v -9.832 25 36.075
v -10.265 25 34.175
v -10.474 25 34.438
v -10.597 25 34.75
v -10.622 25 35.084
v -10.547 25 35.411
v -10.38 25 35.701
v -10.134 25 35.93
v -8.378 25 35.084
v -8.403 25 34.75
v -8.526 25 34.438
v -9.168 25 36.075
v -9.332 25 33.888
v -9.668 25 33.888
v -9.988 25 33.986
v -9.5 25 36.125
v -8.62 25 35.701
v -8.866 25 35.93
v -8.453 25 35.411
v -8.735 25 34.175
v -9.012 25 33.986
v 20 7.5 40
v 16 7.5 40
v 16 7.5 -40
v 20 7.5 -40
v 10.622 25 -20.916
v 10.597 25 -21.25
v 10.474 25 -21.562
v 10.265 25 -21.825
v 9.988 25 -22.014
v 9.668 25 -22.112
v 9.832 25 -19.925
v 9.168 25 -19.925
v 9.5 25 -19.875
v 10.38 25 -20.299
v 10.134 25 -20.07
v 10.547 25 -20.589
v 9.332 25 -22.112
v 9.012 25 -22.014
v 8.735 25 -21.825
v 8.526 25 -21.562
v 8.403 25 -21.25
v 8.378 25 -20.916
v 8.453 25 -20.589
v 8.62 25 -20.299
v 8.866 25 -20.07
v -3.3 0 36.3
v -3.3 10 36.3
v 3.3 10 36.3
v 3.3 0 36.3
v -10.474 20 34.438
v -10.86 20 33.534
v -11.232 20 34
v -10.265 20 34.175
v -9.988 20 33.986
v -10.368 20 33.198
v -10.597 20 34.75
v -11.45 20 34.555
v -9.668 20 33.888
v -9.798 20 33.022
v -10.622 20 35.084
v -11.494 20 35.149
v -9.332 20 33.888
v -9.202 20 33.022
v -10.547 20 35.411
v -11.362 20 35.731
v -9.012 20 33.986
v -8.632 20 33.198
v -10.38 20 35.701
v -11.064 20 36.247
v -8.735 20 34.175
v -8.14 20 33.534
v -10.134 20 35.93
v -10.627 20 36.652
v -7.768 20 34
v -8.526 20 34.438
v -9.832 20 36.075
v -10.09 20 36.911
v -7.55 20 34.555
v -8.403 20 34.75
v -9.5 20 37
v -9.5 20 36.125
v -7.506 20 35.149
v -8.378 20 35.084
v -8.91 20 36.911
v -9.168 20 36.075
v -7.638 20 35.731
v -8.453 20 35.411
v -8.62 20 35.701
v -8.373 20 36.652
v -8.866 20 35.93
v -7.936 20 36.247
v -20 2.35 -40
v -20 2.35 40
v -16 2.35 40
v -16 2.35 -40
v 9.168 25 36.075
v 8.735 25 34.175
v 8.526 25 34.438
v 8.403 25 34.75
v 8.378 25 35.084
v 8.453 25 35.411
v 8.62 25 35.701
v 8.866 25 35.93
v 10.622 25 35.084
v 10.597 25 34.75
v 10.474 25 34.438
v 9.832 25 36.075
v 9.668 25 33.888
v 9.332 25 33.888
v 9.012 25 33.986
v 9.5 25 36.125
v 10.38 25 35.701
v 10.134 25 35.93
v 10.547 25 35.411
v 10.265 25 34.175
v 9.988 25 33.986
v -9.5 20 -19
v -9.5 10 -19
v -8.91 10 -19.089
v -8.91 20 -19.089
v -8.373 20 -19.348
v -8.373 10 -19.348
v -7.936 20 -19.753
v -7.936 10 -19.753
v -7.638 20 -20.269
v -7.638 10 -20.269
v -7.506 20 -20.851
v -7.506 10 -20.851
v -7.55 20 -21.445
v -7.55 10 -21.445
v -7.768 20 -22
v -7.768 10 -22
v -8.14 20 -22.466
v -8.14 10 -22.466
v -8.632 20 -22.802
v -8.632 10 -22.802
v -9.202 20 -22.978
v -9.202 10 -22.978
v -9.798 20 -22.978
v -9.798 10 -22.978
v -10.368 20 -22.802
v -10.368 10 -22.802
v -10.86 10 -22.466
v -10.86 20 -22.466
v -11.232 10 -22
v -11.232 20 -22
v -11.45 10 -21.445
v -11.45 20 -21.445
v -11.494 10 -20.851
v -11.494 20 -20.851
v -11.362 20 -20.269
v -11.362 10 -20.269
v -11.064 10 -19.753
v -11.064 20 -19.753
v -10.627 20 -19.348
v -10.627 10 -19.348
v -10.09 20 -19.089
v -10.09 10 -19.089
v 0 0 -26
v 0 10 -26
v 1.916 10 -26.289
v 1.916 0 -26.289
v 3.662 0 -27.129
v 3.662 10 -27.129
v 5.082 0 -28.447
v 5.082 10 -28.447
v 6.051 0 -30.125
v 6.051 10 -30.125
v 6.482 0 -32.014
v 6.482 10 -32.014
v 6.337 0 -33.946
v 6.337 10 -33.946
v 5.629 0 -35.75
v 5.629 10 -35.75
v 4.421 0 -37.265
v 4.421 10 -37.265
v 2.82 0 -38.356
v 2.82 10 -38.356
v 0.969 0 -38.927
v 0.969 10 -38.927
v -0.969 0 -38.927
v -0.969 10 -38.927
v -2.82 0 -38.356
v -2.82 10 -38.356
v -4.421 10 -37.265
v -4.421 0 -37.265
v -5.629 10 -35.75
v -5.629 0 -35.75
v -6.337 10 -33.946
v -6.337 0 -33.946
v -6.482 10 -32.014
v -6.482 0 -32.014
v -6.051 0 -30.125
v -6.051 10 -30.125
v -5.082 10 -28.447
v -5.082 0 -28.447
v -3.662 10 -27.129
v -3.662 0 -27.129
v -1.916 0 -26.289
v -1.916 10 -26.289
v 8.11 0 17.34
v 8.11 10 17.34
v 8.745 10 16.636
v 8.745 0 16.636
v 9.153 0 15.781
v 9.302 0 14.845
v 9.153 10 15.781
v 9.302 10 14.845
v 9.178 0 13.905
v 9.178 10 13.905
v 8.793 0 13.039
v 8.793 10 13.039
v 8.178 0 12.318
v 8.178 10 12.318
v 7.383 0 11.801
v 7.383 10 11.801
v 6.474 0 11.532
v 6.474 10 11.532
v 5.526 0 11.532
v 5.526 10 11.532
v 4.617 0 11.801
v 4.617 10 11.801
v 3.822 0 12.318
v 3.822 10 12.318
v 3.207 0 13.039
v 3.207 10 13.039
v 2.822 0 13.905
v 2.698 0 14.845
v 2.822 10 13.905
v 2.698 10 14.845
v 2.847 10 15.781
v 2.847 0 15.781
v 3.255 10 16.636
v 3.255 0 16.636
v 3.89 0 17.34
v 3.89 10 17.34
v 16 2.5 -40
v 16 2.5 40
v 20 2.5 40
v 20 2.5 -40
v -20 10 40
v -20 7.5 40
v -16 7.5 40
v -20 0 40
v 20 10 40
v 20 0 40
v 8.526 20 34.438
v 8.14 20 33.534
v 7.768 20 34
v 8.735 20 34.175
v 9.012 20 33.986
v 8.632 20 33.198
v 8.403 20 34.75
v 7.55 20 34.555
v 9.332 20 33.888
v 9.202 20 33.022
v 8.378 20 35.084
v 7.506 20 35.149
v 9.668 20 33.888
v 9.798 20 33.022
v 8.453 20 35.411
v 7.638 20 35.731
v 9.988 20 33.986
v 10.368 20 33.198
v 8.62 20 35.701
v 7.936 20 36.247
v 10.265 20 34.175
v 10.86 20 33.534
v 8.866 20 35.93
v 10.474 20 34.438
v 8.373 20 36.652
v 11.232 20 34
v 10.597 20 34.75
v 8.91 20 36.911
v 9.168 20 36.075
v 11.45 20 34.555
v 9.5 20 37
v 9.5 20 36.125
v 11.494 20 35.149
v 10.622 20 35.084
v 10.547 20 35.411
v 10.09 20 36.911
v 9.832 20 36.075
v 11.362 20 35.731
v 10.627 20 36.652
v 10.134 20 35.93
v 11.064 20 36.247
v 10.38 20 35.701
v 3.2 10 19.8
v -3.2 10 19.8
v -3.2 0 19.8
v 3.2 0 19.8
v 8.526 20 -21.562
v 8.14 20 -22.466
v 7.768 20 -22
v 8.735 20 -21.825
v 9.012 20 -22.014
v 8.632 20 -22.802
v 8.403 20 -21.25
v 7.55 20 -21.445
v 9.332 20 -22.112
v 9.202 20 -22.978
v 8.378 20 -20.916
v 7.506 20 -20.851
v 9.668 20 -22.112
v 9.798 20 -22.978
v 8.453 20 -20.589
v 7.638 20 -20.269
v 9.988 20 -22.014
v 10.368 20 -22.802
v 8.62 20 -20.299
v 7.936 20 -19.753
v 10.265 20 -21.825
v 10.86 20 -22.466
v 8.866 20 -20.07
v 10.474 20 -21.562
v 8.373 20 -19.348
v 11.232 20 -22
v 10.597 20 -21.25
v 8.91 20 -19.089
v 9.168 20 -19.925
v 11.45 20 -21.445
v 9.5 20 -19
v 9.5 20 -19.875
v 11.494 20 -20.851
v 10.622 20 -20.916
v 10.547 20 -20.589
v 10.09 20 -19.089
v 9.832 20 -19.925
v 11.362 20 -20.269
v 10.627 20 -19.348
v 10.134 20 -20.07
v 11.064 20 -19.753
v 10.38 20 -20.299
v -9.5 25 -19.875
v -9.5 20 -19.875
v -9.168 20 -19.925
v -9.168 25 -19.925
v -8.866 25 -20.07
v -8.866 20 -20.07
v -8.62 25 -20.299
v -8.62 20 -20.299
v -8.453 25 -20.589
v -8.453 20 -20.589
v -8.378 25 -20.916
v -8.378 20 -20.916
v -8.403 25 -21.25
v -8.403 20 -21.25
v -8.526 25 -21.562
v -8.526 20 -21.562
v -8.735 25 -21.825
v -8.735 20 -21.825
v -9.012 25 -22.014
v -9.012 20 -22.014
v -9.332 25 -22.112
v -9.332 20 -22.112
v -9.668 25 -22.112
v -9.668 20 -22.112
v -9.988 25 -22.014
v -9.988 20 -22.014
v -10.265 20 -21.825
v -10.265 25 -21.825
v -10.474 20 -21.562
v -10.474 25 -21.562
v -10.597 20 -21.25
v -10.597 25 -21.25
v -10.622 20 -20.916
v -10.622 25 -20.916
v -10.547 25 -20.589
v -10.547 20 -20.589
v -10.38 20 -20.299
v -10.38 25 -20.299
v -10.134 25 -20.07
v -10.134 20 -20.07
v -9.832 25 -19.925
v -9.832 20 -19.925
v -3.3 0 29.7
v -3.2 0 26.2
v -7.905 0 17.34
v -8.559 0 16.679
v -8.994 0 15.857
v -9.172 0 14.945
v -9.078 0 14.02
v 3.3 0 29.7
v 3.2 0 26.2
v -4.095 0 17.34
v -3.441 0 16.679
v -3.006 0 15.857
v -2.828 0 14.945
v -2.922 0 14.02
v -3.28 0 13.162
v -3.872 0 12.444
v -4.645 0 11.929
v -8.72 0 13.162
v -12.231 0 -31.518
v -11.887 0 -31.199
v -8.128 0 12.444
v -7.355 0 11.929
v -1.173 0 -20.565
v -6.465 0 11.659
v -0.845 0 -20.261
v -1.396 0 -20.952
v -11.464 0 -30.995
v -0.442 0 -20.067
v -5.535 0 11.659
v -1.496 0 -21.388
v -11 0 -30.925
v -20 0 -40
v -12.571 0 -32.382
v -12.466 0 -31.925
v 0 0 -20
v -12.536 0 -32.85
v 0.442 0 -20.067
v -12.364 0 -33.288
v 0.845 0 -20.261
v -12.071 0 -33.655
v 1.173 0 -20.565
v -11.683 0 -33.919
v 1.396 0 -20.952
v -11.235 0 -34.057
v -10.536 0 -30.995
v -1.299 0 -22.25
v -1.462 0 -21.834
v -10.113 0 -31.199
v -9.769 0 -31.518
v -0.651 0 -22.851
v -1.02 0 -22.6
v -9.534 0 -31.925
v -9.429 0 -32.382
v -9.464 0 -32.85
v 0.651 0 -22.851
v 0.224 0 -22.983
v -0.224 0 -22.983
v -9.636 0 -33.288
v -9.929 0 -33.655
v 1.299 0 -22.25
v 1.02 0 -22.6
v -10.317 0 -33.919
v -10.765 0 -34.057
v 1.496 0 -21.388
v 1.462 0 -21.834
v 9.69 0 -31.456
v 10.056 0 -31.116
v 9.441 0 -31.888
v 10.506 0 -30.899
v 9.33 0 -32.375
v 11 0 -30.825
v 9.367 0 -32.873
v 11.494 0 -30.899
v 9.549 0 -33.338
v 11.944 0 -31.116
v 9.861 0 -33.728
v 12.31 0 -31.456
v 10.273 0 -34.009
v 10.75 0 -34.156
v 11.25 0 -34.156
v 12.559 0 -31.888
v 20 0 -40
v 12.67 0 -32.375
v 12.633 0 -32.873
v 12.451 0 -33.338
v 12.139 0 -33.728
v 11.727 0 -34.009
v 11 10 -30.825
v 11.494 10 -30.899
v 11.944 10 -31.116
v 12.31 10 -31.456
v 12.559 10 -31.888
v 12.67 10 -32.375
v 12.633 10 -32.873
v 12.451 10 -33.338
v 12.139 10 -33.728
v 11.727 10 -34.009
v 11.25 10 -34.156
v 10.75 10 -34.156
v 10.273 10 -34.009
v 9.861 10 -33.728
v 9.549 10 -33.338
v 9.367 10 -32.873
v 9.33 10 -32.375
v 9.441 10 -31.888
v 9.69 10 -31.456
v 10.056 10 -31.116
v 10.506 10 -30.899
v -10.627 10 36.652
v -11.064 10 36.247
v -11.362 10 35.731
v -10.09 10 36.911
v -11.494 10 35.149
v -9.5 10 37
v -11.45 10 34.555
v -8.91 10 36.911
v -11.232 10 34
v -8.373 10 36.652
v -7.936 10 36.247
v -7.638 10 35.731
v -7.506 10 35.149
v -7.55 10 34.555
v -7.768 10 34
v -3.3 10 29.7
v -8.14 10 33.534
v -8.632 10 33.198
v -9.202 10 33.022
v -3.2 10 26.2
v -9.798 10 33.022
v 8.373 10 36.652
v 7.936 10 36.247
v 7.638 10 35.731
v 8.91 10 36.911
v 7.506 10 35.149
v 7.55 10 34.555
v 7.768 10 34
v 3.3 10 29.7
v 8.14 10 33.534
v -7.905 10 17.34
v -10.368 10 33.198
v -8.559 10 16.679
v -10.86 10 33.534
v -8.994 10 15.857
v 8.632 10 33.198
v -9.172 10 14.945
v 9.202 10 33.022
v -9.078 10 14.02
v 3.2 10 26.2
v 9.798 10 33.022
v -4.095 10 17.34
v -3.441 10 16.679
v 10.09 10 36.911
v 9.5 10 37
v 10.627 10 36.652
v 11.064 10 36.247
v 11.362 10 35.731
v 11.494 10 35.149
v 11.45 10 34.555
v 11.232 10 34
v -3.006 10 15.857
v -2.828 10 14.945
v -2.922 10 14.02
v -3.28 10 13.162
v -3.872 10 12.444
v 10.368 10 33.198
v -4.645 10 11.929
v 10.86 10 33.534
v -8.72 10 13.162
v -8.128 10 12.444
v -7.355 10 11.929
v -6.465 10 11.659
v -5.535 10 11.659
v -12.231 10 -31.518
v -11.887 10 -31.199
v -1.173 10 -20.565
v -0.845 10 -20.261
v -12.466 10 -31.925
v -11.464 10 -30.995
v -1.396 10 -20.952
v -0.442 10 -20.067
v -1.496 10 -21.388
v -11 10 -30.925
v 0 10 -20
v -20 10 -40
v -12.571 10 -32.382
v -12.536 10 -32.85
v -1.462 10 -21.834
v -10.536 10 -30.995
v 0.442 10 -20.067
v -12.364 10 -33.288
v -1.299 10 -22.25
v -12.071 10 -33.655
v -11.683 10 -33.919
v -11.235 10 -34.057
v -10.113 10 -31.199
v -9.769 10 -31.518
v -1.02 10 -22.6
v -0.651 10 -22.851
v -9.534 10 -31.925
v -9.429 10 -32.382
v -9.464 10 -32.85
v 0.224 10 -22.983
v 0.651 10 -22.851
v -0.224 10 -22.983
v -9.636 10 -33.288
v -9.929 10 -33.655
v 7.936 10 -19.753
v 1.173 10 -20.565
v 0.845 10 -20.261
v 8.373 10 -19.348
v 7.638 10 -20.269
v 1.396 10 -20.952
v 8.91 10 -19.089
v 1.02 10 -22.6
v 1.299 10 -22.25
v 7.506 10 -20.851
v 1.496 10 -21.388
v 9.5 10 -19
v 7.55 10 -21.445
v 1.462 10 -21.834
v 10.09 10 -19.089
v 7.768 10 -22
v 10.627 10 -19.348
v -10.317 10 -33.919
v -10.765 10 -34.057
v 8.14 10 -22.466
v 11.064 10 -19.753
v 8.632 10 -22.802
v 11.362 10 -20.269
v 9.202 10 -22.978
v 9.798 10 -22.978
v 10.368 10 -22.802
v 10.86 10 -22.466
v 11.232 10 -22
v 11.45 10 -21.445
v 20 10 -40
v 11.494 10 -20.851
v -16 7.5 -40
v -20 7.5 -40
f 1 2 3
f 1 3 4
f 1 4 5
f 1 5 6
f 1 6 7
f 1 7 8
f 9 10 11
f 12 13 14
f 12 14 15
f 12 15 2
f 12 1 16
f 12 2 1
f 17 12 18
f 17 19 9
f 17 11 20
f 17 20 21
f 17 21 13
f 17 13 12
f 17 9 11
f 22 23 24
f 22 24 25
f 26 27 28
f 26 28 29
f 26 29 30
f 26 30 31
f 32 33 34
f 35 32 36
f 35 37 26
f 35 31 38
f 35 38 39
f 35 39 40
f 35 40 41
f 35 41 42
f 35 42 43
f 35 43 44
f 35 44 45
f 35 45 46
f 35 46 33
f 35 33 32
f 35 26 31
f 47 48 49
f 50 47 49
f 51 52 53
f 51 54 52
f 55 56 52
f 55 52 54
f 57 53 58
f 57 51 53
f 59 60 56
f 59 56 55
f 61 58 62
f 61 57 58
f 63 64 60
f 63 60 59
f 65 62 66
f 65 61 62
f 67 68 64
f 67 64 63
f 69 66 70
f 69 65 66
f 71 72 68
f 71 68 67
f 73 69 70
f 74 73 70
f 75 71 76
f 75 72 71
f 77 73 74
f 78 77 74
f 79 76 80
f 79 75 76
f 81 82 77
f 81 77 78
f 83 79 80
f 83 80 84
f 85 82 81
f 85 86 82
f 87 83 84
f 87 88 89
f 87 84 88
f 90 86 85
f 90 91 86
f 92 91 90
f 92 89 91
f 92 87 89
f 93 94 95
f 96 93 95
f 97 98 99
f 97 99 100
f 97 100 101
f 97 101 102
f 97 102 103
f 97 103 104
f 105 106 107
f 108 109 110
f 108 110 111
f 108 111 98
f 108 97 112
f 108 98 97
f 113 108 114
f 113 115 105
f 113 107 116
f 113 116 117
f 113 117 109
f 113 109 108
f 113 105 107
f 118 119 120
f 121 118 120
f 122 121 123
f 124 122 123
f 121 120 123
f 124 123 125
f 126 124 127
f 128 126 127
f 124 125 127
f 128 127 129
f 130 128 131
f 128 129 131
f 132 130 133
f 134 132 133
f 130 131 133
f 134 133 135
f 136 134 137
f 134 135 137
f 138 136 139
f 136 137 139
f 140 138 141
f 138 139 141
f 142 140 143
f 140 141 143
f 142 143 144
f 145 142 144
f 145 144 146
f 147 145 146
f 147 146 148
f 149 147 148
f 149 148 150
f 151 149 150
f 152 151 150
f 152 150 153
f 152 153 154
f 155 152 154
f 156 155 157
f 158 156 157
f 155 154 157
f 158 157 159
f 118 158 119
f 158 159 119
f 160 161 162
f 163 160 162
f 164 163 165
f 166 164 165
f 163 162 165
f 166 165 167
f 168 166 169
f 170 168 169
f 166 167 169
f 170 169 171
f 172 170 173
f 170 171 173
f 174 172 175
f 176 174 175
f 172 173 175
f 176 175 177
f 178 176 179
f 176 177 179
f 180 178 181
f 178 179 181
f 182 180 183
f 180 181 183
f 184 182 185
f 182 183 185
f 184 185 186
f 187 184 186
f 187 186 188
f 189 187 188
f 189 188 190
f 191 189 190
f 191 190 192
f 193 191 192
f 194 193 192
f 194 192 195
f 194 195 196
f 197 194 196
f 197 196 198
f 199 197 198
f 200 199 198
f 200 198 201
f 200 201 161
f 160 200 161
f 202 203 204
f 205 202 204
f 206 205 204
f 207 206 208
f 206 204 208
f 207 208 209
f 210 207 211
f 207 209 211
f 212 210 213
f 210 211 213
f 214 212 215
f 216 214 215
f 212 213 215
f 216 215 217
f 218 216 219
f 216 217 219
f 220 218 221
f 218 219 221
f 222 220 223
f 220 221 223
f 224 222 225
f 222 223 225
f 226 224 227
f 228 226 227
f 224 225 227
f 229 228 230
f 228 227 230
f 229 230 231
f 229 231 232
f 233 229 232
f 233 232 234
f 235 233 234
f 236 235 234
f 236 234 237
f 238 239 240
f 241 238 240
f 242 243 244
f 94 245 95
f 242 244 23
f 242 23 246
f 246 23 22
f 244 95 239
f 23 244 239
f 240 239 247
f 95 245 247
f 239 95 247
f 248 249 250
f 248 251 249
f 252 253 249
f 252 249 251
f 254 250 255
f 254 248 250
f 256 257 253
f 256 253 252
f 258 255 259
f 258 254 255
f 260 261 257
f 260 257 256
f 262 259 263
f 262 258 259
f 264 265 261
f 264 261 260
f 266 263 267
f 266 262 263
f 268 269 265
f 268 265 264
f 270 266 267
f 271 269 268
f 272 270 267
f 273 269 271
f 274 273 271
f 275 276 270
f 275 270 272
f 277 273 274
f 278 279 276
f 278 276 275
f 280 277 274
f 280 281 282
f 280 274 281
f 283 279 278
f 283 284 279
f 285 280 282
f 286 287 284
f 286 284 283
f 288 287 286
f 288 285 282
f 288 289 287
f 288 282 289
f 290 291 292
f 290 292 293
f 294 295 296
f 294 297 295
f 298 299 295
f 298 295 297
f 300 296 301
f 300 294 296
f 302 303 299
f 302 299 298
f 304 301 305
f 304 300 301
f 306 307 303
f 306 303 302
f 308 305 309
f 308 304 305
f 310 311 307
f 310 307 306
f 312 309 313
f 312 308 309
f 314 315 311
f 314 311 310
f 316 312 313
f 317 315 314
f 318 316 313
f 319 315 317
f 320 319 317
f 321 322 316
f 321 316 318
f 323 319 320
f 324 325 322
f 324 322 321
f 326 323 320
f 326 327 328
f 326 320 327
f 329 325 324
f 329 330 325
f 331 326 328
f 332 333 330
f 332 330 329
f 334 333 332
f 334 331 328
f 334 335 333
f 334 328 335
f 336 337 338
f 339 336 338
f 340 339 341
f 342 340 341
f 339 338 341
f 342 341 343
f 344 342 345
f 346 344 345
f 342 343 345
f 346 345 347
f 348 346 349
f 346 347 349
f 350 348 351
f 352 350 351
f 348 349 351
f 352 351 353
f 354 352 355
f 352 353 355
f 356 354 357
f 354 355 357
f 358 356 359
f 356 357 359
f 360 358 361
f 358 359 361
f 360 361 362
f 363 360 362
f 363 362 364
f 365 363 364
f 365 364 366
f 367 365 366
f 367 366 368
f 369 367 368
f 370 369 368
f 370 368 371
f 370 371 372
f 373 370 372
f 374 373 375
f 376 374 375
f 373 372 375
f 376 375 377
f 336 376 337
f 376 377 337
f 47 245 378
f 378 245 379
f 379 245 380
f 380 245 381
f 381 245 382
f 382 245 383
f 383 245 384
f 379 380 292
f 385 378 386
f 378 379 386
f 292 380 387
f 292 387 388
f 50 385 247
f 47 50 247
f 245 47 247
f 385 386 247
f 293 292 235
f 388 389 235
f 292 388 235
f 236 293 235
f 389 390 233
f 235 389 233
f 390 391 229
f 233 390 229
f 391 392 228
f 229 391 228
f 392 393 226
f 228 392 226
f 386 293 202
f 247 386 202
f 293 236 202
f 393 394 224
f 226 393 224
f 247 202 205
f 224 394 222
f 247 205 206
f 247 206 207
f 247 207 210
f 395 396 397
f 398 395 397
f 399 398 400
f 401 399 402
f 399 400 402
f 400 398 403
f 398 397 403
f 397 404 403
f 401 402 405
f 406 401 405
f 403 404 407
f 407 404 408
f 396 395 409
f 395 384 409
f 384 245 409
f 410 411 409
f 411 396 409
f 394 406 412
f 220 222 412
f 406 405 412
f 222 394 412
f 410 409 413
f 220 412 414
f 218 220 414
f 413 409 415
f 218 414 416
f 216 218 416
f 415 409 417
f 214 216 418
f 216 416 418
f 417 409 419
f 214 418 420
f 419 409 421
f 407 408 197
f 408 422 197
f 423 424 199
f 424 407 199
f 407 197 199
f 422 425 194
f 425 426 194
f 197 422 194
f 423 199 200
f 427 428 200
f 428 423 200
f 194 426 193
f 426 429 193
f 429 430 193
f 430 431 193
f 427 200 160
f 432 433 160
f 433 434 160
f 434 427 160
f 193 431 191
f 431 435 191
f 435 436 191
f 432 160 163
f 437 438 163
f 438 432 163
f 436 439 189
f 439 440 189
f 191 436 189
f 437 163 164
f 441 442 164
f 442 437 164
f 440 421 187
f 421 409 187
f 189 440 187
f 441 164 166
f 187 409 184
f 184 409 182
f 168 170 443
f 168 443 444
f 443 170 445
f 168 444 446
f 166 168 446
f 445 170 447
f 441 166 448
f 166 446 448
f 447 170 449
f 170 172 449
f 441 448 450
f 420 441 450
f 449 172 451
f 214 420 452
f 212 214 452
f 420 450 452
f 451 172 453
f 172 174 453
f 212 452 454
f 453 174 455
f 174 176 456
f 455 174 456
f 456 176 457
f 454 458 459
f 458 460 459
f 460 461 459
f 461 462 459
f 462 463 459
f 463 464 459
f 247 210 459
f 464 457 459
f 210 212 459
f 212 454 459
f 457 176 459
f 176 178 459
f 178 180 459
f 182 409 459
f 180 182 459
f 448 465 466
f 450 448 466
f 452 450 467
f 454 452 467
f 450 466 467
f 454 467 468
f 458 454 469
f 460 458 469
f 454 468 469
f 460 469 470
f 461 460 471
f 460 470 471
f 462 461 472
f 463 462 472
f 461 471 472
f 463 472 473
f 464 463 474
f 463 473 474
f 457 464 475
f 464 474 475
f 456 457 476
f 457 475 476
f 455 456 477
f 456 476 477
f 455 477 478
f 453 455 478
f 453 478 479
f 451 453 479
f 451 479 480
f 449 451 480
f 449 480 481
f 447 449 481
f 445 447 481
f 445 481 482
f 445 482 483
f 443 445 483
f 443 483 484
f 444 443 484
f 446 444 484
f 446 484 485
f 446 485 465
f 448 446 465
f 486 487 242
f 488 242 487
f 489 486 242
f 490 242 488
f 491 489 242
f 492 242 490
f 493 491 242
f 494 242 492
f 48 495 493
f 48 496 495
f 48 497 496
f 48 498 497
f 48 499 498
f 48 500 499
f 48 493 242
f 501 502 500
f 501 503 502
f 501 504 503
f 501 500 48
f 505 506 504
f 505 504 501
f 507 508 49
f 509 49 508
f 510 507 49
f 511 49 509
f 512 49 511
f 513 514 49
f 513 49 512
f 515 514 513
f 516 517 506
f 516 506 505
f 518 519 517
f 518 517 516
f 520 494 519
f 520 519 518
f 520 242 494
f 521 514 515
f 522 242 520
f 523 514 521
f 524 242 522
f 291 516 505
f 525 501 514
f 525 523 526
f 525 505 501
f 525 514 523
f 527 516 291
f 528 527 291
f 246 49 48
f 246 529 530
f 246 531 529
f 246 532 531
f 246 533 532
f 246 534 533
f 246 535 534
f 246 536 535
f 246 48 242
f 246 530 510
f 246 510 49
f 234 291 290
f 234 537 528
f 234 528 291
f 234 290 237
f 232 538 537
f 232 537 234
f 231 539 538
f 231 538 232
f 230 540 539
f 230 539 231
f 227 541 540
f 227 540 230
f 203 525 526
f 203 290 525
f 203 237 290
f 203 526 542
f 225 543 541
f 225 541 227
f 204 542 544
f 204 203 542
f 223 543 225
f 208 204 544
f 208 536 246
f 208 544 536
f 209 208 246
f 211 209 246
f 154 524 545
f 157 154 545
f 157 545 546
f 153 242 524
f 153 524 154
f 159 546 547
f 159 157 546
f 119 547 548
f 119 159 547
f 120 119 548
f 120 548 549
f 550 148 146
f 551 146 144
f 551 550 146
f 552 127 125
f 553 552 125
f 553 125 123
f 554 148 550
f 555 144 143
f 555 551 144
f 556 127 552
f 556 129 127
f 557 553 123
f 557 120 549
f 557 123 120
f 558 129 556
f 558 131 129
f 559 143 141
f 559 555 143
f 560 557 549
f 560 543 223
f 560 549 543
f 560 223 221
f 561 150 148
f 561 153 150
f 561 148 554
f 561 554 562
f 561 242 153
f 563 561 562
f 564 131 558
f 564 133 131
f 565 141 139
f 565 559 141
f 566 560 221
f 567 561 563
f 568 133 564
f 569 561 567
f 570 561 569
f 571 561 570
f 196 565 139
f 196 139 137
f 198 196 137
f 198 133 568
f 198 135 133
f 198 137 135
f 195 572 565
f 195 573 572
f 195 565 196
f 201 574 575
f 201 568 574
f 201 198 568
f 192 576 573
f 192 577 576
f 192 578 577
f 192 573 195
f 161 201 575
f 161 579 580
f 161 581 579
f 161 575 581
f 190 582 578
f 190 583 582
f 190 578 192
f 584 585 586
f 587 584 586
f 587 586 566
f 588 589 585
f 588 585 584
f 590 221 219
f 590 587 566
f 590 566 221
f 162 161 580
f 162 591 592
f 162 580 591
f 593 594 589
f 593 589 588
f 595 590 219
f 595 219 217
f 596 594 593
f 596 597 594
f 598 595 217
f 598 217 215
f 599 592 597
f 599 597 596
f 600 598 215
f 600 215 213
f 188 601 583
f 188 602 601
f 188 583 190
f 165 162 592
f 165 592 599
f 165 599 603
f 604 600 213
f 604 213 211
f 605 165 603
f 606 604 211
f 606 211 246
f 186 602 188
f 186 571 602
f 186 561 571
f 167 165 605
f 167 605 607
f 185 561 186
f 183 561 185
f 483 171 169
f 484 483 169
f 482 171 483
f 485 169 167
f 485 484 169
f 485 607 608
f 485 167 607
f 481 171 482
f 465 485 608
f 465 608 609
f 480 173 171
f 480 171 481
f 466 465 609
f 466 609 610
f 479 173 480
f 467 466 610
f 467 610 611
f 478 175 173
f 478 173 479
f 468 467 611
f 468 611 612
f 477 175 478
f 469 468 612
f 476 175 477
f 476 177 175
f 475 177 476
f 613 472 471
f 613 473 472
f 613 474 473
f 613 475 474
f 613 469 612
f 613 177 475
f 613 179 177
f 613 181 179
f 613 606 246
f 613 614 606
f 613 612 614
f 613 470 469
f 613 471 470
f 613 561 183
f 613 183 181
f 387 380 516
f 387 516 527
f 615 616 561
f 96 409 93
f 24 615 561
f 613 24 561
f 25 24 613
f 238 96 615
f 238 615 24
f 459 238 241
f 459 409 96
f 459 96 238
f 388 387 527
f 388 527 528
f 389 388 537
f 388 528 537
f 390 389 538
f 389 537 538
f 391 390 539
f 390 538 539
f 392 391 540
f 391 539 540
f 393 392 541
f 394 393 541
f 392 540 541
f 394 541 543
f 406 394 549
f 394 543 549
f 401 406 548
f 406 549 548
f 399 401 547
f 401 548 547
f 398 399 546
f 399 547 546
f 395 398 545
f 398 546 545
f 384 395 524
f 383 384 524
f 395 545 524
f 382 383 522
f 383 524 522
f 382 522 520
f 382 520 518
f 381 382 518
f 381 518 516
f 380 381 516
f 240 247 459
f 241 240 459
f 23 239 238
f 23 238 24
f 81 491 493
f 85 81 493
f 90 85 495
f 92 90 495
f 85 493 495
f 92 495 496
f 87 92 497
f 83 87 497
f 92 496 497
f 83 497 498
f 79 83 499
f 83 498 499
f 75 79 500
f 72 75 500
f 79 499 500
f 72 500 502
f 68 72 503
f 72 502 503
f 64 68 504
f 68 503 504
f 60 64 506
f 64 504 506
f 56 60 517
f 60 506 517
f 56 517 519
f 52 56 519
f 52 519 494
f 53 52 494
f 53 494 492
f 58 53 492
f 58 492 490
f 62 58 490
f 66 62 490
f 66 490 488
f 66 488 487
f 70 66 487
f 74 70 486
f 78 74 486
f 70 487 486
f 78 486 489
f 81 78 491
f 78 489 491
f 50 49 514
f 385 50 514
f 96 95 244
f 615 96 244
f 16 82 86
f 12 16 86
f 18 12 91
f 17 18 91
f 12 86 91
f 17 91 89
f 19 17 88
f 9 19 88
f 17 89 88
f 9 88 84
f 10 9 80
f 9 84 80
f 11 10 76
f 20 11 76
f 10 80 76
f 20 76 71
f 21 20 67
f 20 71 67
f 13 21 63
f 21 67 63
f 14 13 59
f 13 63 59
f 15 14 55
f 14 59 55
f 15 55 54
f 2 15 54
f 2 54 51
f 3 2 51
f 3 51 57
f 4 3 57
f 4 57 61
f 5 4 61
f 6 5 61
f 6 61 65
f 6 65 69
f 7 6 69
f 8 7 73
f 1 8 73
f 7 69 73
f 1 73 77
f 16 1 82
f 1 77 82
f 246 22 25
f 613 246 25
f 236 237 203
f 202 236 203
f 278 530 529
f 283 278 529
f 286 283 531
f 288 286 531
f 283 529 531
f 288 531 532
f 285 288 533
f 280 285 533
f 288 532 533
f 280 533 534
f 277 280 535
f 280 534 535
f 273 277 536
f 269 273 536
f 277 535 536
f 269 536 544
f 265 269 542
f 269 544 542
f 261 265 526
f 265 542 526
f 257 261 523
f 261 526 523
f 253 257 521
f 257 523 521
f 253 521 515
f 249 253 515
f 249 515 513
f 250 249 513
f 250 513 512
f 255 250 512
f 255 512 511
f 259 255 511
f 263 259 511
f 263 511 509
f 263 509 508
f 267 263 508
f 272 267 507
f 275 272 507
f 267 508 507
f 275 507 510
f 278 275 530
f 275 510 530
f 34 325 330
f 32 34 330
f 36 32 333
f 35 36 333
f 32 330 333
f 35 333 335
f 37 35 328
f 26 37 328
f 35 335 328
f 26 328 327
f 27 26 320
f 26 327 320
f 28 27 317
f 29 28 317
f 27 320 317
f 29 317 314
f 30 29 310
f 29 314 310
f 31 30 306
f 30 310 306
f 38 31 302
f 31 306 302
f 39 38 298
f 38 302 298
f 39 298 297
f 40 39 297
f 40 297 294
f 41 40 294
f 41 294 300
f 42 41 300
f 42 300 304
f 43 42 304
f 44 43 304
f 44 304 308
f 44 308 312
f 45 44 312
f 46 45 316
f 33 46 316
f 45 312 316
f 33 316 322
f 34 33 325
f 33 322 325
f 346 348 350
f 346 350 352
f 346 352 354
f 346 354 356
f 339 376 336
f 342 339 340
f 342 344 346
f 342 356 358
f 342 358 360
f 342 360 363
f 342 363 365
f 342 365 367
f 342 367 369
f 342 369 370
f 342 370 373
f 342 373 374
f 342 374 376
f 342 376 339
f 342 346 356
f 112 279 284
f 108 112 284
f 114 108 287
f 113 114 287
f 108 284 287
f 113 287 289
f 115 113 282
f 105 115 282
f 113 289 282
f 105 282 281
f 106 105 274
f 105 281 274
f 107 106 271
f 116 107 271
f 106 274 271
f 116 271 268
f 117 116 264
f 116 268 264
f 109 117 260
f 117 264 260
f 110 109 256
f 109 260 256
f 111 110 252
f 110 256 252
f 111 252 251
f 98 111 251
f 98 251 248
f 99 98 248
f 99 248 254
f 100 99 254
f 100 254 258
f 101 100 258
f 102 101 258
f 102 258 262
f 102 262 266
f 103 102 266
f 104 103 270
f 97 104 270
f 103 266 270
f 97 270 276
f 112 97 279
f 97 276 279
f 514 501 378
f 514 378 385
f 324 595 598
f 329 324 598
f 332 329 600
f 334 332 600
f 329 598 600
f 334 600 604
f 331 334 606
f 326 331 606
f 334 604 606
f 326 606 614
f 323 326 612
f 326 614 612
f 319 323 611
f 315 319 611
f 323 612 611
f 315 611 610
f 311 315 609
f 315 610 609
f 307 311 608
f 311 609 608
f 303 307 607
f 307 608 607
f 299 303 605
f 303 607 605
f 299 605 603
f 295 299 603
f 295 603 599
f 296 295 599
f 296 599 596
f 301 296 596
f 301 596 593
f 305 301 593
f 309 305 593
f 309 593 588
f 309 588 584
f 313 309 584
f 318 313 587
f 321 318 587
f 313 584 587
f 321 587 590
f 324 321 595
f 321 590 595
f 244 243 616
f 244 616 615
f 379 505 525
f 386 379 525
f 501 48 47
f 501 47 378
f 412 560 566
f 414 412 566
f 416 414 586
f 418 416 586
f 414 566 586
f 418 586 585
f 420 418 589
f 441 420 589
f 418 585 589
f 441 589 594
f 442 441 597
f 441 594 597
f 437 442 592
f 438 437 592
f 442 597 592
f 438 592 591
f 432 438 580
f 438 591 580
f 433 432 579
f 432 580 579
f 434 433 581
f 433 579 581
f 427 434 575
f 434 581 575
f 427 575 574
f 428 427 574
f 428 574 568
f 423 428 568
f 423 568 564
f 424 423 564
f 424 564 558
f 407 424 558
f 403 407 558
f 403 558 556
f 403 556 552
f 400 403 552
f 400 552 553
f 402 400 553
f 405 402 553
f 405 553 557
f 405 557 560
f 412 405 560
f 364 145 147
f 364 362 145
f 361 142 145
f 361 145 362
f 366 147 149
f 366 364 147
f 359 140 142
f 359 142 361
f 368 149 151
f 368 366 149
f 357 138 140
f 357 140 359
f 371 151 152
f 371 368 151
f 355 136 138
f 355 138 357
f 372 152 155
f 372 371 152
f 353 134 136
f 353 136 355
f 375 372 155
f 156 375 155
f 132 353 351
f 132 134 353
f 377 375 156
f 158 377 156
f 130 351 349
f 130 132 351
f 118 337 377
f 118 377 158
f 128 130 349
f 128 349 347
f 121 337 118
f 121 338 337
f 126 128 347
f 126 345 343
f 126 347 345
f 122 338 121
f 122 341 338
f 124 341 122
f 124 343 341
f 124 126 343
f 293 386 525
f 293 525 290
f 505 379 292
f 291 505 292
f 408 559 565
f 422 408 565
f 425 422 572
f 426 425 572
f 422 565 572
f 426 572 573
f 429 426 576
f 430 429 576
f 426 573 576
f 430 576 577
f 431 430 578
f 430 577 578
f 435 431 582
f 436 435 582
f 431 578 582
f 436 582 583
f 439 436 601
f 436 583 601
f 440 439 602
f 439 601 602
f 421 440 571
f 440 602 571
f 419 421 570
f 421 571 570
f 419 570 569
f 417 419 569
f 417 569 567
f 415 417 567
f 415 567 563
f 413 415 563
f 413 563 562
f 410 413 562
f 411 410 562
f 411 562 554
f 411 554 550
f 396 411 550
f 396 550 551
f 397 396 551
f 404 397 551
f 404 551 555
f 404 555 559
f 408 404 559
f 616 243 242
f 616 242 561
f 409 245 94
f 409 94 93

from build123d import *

# Parameters (mm, degrees)
ESQUISSE2_W             = 40
ESQUISSE2_H             = 80
BOSS_EXTRU_1_DEPTH      = 10
ESQUISSE3_R             = 2
BOSS_EXTRU_2_DEPTH      = 10
ESQUISSE4_R             = 1.125
BOSS_EXTRU_3_DEPTH      = 5
ENL_V_MAT_EXTRU_1_REACH = 49.17
ESQUISSE5_R             = 1.5
ESQUISSE5_R_2           = 1.575
ESQUISSE5_R_3           = 1.675
ESQUISSE5_R_4           = 6.5
ENL_V_MAT_EXTRU_2_REACH = 49.17
ESQUISSE6_W             = 6.6
ESQUISSE6_H             = 6.6
ESQUISSE6_W_2           = 6.4
ESQUISSE6_H_2           = 6.4
ENL_V_MAT_EXTRU_3_DEPTH = 10
ENL_V_MAT_EXTRU_4_REACH = 88.168
ESQUISSE8_W             = 4
ESQUISSE8_H             = 5
ESQUISSE8_H_2           = 5.15


with BuildPart() as part:
    # Esquisse2 → Boss.-Extru.1 (new body)
    with BuildSketch(Plane(origin=(0, 0, 0), x_dir=(1, 0, 0), z_dir=(0, 1, 0))):
        Rectangle(ESQUISSE2_W, ESQUISSE2_H)
    extrude(amount=BOSS_EXTRU_1_DEPTH)

    # Esquisse3 → Boss.-Extru.2 (add)
    with BuildSketch(Plane(origin=(0, 10, 0), x_dir=(1, 0, 0), z_dir=(0, 1, 0))):
        with Locations(Location((9.5, -35, 0), (0, 0, 270))):
            Circle(ESQUISSE3_R)
        with Locations(Location((9.5, 21, 0), (0, 0, 270))):
            Circle(ESQUISSE3_R)
        with Locations(Location((-9.5, -35, 0), (0, 0, 270))):
            Circle(ESQUISSE3_R)
        with Locations(Location((-9.5, 21, 0), (0, 0, 270))):
            Circle(ESQUISSE3_R)
    extrude(amount=BOSS_EXTRU_2_DEPTH)

    # Esquisse4 → Boss.-Extru.3 (add)
    with BuildSketch(Plane(origin=(0, 20, 0), x_dir=(1, 0, 0), z_dir=(0, 1, 0))):
        with Locations(Location((-9.5, -35, 0), (0, 0, 270))):
            Circle(ESQUISSE4_R)
        with Locations(Location((9.5, -35, 0), (0, 0, 270))):
            Circle(ESQUISSE4_R)
        with Locations(Location((-9.5, 21, 0), (0, 0, 270))):
            Circle(ESQUISSE4_R)
        with Locations(Location((9.5, 21, 0), (0, 0, 270))):
            Circle(ESQUISSE4_R)
    extrude(amount=BOSS_EXTRU_3_DEPTH)

    # Esquisse5 → Enlèv. mat.-Extru.1 (cut, up to next)
    with BuildSketch(Plane(origin=(0, 10, 0), x_dir=(1, 0, 0), z_dir=(0, 1, 0)), mode=Mode.PRIVATE) as enl_v_mat_extru_1_sk1:
        with Locations(Location((0, 21.5, 0), (0, 0, 270))):
            Circle(ESQUISSE5_R)
    enl_v_mat_extru_1_tool1 = extrude(enl_v_mat_extru_1_sk1.sketch, amount=-ENL_V_MAT_EXTRU_1_REACH, mode=Mode.PRIVATE) & part.part
    # Esquisse5 → Enlèv. mat.-Extru.1 (cut, up to next)
    with BuildSketch(Plane(origin=(0, 10, 0), x_dir=(1, 0, 0), z_dir=(0, 1, 0)), mode=Mode.PRIVATE) as enl_v_mat_extru_1_sk2:
        with Locations(Location((-11, 32.5, 0), (0, 0, 270))):
            Circle(ESQUISSE5_R_2)
    enl_v_mat_extru_1_tool2 = extrude(enl_v_mat_extru_1_sk2.sketch, amount=-ENL_V_MAT_EXTRU_1_REACH, mode=Mode.PRIVATE) & part.part
    # Esquisse5 → Enlèv. mat.-Extru.1 (cut, up to next)
    with BuildSketch(Plane(origin=(0, 10, 0), x_dir=(1, 0, 0), z_dir=(0, 1, 0)), mode=Mode.PRIVATE) as enl_v_mat_extru_1_sk3:
        with Locations(Location((11, 32.5, 0), (0, 0, 270))):
            Circle(ESQUISSE5_R_3)
    enl_v_mat_extru_1_tool3 = extrude(enl_v_mat_extru_1_sk3.sketch, amount=-ENL_V_MAT_EXTRU_1_REACH, mode=Mode.PRIVATE) & part.part
    # Esquisse5 → Enlèv. mat.-Extru.1 (cut, up to next)
    with BuildSketch(Plane(origin=(0, 10, 0), x_dir=(1, 0, 0), z_dir=(0, 1, 0)), mode=Mode.PRIVATE) as enl_v_mat_extru_1_sk4:
        with Locations(Location((0, 32.5, 0), (0, 0, 270))):
            Circle(ESQUISSE5_R_4)
    enl_v_mat_extru_1_tool4 = extrude(enl_v_mat_extru_1_sk4.sketch, amount=-ENL_V_MAT_EXTRU_1_REACH, mode=Mode.PRIVATE) & part.part
    add(enl_v_mat_extru_1_tool1.solids().sort_by_distance((0, 10, -21.5))[0], mode=Mode.SUBTRACT)
    add(enl_v_mat_extru_1_tool2.solids().sort_by_distance((-11, 10, -32.5))[0], mode=Mode.SUBTRACT)
    add(enl_v_mat_extru_1_tool3.solids().sort_by_distance((11, 10, -32.5))[0], mode=Mode.SUBTRACT)
    add(enl_v_mat_extru_1_tool4.solids().sort_by_distance((0, 10, -32.5))[0], mode=Mode.SUBTRACT)

    # Esquisse6 → Enlèv. mat.-Extru.2 (cut, up to next)
    with BuildSketch(Plane(origin=(0, 10, 0), x_dir=(1, 0, 0), z_dir=(0, 1, 0)), mode=Mode.PRIVATE) as enl_v_mat_extru_2_sk1:
        with Locations((0, -33)):
            Rectangle(ESQUISSE6_W, ESQUISSE6_H)
    enl_v_mat_extru_2_tool1 = extrude(enl_v_mat_extru_2_sk1.sketch, amount=-ENL_V_MAT_EXTRU_2_REACH, mode=Mode.PRIVATE) & part.part
    # Esquisse6 → Enlèv. mat.-Extru.2 (cut, up to next)
    with BuildSketch(Plane(origin=(0, 10, 0), x_dir=(1, 0, 0), z_dir=(0, 1, 0)), mode=Mode.PRIVATE) as enl_v_mat_extru_2_sk2:
        with Locations((0, -23)):
            Rectangle(ESQUISSE6_W_2, ESQUISSE6_H_2)
    enl_v_mat_extru_2_tool2 = extrude(enl_v_mat_extru_2_sk2.sketch, amount=-ENL_V_MAT_EXTRU_2_REACH, mode=Mode.PRIVATE) & part.part
    add(enl_v_mat_extru_2_tool1.solids().sort_by_distance((0, 10, 33))[0], mode=Mode.SUBTRACT)
    add(enl_v_mat_extru_2_tool2.solids().sort_by_distance((0, 10, 23))[0], mode=Mode.SUBTRACT)

    # Esquisse7 → Enlèv. mat.-Extru.3 (cut)
    with BuildSketch(Plane(origin=(0, 10, 0), x_dir=(1, 0, 0), z_dir=(0, 1, 0))):
        with BuildLine():
            Line((-7.905, -17.34), (-4.095, -17.34))
            ThreePointArc((-4.095, -17.34), (-6, -11.625), (-7.905, -17.34))
        make_face()
        with BuildLine():
            Line((3.890117539, -17.34), (8.109882461, -17.34))
            ThreePointArc((8.109882461, -17.34), (6, -11.498), (3.890117539, -17.34))
        make_face()
    extrude(amount=-ENL_V_MAT_EXTRU_3_DEPTH, mode=Mode.SUBTRACT)

    # Esquisse8 → Enlèv. mat.-Extru.4 (cut, up to next)
    with BuildSketch(Plane.XY.offset(40), mode=Mode.PRIVATE) as enl_v_mat_extru_4_sk1:
        with Locations((18, 5)):
            Rectangle(ESQUISSE8_W, ESQUISSE8_H)
    enl_v_mat_extru_4_tool1 = extrude(enl_v_mat_extru_4_sk1.sketch, amount=-ENL_V_MAT_EXTRU_4_REACH, mode=Mode.PRIVATE) & part.part
    # Esquisse8 → Enlèv. mat.-Extru.4 (cut, up to next)
    with BuildSketch(Plane.XY.offset(40), mode=Mode.PRIVATE) as enl_v_mat_extru_4_sk2:
        with Locations((-18, 4.925)):
            Rectangle(ESQUISSE8_W, ESQUISSE8_H_2)
    enl_v_mat_extru_4_tool2 = extrude(enl_v_mat_extru_4_sk2.sketch, amount=-ENL_V_MAT_EXTRU_4_REACH, mode=Mode.PRIVATE) & part.part
    add(enl_v_mat_extru_4_tool1.solids().sort_by_distance((18, 5, 40))[0], mode=Mode.SUBTRACT)
    add(enl_v_mat_extru_4_tool2.solids().sort_by_distance((-18, 4.925, 40))[0], mode=Mode.SUBTRACT)


solid = part.part
